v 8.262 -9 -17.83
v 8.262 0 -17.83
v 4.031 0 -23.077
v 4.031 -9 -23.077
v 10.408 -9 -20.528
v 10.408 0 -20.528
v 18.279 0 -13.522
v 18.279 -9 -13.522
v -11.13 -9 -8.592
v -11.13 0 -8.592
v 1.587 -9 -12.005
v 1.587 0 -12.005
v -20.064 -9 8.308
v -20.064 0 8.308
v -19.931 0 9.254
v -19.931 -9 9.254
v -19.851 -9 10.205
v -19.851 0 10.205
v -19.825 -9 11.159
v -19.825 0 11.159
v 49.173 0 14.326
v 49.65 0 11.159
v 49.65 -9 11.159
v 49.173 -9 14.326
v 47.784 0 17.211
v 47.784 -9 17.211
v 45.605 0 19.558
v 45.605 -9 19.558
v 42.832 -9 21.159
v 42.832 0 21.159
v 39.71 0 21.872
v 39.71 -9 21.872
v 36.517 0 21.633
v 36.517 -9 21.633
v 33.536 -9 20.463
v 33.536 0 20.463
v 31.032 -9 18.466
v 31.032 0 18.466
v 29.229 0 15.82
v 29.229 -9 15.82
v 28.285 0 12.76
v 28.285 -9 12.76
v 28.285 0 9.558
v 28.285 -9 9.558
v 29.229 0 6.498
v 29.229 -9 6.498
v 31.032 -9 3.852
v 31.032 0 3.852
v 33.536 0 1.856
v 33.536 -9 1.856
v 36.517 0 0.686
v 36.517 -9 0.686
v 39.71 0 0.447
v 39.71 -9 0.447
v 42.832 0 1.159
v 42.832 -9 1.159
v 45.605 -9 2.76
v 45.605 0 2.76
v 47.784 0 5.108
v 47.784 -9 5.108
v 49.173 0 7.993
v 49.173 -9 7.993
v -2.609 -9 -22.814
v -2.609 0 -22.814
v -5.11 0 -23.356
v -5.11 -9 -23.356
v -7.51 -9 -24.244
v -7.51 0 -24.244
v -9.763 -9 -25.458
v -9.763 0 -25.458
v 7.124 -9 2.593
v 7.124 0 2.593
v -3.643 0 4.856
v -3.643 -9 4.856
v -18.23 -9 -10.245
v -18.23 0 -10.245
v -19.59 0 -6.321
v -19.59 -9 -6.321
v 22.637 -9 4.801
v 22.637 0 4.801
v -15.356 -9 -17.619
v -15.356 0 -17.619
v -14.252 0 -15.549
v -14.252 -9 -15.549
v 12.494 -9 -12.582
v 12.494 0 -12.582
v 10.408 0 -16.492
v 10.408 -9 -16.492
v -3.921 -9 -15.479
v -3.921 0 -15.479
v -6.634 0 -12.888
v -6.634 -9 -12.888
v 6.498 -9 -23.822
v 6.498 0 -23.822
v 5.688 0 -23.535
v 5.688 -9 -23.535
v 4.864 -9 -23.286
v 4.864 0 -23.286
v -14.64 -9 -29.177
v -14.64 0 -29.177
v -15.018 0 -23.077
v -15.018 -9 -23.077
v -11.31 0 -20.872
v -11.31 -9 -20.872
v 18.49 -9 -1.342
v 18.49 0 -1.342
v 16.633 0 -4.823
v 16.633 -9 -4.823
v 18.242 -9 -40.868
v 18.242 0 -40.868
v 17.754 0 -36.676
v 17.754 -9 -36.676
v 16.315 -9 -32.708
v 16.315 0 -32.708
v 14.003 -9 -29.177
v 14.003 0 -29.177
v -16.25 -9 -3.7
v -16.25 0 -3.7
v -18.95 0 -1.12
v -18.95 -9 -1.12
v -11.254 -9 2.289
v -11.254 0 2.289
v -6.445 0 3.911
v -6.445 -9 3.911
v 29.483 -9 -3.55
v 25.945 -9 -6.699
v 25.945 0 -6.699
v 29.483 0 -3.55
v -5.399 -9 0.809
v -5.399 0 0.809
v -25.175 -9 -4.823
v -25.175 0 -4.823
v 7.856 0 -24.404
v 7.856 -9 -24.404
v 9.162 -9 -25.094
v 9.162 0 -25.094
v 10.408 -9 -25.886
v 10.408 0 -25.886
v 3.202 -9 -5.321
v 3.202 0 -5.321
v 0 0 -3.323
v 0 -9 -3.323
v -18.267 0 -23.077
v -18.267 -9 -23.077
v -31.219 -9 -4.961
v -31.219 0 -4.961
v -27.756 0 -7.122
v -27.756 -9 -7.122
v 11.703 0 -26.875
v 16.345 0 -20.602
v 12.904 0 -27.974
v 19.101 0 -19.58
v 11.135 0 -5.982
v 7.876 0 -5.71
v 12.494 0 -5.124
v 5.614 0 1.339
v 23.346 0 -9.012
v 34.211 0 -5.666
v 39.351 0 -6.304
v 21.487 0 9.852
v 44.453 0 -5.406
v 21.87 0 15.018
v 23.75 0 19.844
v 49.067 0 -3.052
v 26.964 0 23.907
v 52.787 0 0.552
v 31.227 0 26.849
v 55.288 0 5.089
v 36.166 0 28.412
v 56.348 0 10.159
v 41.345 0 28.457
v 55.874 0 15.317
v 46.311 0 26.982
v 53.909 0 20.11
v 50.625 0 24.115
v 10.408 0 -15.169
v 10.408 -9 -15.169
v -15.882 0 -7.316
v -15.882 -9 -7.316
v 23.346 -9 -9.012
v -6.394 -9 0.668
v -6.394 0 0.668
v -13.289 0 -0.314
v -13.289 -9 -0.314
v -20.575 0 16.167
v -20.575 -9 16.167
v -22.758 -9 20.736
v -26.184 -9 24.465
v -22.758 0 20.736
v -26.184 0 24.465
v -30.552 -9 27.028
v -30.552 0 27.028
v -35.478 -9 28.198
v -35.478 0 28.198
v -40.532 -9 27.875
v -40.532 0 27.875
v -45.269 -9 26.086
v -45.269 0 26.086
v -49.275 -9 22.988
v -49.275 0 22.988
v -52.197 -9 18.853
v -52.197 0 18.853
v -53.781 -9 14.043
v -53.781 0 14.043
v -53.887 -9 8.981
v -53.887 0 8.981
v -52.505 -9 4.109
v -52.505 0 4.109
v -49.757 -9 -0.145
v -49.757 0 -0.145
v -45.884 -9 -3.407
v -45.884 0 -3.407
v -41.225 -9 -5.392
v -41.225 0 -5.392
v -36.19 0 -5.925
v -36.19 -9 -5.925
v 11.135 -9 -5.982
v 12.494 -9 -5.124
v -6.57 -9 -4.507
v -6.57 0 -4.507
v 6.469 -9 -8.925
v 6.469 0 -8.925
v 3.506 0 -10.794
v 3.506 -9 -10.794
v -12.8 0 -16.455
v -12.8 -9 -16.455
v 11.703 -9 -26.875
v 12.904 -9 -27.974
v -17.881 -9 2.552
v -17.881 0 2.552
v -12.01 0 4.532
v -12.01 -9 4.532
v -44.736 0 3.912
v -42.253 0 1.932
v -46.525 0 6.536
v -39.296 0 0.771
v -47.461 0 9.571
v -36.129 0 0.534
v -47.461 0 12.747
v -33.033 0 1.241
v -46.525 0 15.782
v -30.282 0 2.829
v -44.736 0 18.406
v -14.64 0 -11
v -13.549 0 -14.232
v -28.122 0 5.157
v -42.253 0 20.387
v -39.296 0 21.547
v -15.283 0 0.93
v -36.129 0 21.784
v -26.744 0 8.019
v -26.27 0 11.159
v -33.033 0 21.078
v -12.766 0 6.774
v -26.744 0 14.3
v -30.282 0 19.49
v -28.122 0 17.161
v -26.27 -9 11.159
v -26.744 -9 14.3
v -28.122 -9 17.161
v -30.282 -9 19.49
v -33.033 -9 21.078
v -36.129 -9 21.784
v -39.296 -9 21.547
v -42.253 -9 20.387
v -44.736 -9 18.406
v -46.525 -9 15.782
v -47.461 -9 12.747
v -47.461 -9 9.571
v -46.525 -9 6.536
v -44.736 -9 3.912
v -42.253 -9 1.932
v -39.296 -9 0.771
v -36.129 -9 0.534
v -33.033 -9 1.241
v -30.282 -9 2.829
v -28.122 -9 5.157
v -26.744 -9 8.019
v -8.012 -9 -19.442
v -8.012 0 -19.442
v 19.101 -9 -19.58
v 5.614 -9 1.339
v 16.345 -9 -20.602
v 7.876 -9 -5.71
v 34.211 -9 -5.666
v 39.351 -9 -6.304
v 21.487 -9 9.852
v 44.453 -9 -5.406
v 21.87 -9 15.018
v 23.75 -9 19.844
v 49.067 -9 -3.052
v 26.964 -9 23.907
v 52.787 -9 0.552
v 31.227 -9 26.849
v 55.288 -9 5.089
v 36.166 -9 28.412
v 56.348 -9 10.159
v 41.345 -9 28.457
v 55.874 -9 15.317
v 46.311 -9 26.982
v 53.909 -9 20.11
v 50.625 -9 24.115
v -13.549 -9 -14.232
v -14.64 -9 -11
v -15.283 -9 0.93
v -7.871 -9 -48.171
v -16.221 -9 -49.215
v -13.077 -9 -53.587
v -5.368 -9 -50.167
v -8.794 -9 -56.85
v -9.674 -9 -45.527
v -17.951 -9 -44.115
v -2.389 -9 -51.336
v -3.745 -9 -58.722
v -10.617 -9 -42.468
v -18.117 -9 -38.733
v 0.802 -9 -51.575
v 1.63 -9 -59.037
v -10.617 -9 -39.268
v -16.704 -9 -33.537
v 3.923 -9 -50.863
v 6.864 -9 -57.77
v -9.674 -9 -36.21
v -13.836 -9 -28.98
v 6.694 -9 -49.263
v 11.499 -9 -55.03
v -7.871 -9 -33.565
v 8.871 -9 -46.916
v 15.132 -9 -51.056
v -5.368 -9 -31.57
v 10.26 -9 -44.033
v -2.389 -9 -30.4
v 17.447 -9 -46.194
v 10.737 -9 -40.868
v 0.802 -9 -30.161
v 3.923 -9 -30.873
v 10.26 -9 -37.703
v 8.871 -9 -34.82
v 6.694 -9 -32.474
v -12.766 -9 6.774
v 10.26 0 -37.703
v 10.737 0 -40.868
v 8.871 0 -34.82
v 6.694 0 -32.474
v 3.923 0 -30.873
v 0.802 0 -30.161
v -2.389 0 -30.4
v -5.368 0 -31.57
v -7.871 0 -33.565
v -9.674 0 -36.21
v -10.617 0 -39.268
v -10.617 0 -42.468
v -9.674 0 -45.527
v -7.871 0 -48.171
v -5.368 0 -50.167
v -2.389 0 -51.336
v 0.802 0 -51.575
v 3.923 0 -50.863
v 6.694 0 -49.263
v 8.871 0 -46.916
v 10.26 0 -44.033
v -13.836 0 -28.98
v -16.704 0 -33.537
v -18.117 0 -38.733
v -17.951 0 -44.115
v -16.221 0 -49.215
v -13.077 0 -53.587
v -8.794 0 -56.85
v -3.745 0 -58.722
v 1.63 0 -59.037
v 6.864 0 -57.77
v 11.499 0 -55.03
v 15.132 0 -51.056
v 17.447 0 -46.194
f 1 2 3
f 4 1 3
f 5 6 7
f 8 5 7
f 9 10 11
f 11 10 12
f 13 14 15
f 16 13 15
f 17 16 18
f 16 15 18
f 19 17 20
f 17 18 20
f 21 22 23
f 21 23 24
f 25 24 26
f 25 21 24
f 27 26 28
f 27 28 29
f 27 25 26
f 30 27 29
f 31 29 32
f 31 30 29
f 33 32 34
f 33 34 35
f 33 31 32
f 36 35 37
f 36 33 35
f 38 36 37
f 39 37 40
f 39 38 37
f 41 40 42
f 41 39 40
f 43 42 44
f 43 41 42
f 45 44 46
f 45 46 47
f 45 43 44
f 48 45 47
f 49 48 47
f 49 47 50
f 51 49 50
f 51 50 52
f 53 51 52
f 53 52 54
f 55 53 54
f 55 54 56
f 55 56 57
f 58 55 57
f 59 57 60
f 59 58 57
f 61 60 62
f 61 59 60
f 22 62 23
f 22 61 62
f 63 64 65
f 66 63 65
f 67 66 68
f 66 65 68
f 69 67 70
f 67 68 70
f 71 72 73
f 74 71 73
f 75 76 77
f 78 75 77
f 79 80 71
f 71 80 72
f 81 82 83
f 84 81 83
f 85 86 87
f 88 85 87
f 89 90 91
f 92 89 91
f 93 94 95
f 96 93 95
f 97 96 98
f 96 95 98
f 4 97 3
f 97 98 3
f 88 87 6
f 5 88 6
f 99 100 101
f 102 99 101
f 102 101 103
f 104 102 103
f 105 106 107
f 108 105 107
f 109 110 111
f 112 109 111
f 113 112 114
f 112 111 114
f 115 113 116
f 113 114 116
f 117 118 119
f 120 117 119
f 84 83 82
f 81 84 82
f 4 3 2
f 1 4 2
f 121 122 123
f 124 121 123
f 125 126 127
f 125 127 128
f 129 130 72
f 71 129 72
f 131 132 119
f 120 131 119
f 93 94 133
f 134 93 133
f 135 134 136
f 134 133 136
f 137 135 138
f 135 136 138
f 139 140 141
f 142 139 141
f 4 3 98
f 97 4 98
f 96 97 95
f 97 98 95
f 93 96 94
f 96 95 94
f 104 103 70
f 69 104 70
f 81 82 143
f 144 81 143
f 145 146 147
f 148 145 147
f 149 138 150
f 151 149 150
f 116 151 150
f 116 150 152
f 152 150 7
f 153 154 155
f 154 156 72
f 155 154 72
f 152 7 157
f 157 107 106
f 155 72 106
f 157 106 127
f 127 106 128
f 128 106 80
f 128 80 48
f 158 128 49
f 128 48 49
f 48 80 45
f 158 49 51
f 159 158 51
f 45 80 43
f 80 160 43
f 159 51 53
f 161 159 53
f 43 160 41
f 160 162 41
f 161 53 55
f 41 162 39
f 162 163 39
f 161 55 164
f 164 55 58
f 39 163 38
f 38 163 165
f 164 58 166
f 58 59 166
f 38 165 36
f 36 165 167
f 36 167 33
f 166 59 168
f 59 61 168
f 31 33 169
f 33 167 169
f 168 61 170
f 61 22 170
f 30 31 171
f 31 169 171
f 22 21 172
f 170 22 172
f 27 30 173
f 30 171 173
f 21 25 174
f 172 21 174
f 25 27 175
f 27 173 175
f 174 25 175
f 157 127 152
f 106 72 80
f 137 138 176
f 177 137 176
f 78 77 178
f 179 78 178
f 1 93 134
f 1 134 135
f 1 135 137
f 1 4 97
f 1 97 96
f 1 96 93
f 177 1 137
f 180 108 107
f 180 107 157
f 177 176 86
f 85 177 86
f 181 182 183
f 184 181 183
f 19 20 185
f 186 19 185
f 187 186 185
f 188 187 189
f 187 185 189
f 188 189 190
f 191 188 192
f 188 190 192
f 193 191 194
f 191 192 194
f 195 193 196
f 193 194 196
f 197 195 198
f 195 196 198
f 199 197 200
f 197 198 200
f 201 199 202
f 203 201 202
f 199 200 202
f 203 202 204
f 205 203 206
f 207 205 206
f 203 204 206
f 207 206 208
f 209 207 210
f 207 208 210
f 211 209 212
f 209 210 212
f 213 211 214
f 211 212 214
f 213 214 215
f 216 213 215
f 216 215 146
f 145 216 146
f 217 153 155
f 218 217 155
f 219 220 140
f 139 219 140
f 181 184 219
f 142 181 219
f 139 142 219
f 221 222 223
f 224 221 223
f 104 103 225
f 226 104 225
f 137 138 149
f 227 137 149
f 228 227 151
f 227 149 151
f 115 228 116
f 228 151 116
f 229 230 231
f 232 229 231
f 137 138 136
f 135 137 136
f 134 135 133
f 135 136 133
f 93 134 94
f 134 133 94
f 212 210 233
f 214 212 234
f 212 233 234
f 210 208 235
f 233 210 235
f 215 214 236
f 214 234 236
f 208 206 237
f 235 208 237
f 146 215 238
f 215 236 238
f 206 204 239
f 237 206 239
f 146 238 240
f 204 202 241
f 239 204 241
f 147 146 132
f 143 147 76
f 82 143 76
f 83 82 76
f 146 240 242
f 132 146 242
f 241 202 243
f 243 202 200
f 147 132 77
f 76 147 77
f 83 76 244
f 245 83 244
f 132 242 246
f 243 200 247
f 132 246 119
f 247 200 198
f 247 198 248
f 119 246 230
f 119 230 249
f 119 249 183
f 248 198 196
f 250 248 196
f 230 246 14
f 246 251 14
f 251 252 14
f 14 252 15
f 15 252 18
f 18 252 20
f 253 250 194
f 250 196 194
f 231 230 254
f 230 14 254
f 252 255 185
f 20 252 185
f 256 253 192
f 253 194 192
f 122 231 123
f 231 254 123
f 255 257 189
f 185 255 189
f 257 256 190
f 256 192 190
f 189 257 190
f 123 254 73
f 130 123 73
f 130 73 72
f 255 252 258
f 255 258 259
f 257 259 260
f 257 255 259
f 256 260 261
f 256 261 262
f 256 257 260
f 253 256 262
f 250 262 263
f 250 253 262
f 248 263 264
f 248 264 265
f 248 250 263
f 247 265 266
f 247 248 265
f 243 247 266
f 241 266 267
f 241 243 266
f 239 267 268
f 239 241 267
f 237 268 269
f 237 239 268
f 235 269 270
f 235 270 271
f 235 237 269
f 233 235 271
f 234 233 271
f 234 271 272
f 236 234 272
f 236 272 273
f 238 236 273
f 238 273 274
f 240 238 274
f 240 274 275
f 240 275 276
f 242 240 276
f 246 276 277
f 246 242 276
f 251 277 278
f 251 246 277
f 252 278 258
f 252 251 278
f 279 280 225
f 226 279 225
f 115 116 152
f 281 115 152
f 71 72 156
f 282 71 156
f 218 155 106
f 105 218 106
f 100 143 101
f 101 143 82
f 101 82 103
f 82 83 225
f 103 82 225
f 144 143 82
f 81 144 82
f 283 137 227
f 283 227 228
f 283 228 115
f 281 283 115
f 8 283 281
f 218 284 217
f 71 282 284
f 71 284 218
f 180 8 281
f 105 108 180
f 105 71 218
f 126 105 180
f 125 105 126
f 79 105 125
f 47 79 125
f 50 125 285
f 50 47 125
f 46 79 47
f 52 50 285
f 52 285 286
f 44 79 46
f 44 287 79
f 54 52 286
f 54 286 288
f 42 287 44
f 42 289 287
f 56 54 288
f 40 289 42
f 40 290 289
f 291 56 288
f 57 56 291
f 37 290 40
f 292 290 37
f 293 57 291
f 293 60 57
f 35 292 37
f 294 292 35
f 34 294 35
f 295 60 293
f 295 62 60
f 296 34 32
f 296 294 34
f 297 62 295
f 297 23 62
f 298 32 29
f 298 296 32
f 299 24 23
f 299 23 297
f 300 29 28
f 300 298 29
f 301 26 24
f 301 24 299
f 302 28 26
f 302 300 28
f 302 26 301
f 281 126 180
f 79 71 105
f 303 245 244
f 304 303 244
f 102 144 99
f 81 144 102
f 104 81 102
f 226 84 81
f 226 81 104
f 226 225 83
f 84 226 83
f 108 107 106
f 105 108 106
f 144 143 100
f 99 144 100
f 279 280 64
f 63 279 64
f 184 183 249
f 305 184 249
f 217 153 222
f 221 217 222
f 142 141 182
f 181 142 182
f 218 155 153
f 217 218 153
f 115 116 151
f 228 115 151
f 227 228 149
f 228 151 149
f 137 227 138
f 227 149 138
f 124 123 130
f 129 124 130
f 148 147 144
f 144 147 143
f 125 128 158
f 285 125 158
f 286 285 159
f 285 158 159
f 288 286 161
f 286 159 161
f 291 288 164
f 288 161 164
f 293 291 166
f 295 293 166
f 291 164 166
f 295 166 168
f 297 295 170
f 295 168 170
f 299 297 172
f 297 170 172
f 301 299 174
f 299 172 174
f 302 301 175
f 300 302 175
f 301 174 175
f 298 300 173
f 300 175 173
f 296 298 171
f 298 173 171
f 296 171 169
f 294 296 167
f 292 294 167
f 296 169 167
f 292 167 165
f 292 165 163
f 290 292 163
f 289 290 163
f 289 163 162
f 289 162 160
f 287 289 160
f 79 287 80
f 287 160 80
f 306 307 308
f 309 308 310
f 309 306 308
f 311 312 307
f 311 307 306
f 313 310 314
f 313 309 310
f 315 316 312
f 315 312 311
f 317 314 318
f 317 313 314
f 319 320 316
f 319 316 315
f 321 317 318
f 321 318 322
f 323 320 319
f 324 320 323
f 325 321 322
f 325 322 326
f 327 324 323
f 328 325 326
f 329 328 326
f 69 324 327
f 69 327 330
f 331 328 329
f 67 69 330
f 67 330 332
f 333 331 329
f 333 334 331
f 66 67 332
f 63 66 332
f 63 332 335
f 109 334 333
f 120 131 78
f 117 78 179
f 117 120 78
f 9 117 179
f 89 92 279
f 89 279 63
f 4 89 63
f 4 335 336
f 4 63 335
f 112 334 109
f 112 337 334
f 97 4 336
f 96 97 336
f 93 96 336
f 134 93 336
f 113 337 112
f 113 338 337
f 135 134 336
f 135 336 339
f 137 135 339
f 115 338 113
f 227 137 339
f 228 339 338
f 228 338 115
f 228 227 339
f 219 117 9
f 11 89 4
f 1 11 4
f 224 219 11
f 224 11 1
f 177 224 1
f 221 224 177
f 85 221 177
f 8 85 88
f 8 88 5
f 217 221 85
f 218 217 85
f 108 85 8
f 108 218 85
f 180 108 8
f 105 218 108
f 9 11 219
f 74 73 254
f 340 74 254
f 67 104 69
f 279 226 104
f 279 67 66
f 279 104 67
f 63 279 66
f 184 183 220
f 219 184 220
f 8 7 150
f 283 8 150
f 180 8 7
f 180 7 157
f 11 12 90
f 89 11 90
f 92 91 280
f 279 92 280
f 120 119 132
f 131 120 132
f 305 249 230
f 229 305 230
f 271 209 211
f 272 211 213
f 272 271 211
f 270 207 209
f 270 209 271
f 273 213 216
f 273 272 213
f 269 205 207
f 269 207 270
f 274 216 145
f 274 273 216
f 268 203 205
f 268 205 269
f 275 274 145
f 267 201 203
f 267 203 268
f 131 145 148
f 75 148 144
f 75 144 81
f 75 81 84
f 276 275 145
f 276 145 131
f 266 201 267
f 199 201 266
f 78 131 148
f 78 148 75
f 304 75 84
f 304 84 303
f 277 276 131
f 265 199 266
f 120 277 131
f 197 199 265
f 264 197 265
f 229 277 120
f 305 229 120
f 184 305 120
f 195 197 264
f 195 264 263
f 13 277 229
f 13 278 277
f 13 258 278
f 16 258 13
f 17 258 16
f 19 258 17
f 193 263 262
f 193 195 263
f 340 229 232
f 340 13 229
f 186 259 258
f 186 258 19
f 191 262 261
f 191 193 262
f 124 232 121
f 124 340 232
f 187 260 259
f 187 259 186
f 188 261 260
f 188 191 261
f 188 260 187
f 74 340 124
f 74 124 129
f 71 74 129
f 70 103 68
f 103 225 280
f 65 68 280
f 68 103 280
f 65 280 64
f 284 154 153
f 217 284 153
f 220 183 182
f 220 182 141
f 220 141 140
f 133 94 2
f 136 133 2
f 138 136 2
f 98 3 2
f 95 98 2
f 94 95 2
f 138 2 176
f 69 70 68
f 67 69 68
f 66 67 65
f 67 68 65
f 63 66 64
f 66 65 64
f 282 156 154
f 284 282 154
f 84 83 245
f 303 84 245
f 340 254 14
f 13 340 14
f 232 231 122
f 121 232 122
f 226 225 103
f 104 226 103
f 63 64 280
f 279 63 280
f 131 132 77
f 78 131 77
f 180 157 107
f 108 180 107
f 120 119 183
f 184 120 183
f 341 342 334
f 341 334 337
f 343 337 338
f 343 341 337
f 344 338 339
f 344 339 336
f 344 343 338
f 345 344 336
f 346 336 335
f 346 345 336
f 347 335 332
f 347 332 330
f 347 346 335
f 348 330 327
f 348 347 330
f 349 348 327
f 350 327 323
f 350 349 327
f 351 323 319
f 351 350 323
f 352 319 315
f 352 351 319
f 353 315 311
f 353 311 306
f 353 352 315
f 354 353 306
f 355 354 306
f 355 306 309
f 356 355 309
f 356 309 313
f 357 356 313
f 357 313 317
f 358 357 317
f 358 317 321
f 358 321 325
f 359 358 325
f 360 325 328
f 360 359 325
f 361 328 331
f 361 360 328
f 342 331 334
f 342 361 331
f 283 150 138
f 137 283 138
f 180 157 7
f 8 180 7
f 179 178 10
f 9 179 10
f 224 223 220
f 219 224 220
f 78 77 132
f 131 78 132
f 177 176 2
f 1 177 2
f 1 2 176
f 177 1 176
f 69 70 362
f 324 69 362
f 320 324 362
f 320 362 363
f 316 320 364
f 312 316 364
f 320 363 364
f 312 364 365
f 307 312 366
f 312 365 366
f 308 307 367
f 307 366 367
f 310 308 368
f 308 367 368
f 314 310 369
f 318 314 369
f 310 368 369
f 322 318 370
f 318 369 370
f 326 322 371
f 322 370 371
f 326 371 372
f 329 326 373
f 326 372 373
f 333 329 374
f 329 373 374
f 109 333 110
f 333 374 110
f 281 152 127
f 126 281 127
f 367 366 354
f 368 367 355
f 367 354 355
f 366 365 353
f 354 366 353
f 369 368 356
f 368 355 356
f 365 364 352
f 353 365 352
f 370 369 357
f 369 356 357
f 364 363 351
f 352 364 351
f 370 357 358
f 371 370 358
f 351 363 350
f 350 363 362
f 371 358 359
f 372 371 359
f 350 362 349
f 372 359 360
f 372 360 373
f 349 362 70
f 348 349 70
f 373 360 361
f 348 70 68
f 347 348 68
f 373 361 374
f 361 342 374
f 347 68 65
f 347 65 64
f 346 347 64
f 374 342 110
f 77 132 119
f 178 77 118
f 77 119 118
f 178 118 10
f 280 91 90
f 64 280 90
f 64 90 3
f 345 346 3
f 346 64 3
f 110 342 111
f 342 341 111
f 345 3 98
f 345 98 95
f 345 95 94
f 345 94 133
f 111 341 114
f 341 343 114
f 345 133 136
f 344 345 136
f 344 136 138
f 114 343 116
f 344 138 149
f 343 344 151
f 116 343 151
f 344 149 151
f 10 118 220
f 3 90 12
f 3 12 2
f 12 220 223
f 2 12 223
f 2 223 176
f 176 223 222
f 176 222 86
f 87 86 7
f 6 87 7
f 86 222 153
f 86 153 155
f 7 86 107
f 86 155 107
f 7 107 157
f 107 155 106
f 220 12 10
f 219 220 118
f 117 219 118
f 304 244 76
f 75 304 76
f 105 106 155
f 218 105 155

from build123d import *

# Parameters (mm, degrees)
F0_R     = 10.6549645795
F1_DEPTH = 9
F0_R_2   = 10.7427439212
F0_R_3   = 10.7368986297
F2_DEPTH = 9


with BuildPart() as f1:
    # F0 (on Front) → F1 (new body)
    with BuildSketch(Plane.XZ):
        with BuildLine():
            ThreePointArc((-20.0641651181, 8.3083463069), (-19.8847789494, 9.7287968623), (-19.8248435155, 11.1592747271))
            ThreePointArc((-19.8248435155, 11.1592747271), (-50.8899433357, 21.0294767793), (-31.2187251884, -4.9609924738))
            ThreePointArc((-31.2187251884, -4.9609924738), (-29.9643391784, -4.4603530234), (-28.7533751249, -3.8622809686))
            ThreePointArc((-28.7533751249, -3.8622809686), (-25.1760860399, -1.2658091713), (-22.3838279271, 2.160844827))
            ThreePointArc((-22.3838279271, 2.160844827), (-21.7131808774, 3.3479085645), (-21.1392335311, 4.5846268937))
            ThreePointArc((-21.1392335311, 4.5846268937), (-20.4958618387, 6.4159304479), (-20.0641651181, 8.3083463069))
        make_face()
        with Locations((-36.9254052639, 11.1592747271)):
            Circle(F0_R, mode=Mode.SUBTRACT)
        Polygon((-25.0467206421, -8.8123781663), (-27.7558582251, -7.1218522362), (-18.2671947269, -23.0767760102), (-15.3557659771, -17.6188090984), (-14.2515066154, -15.5486876646), align=None)
        Polygon((-18.2299170021, -10.2454867911), (-25.0467206421, -8.8123781663), (-14.2515066154, -15.5486876646), (-13.549314167, -14.2323088422), (-14.6395119997, -11.0003039528), align=None)
        with BuildLine():
            ThreePointArc((-28.7533751249, -3.8622809686), (-29.9643391784, -4.4603530234), (-31.2187251884, -4.9609924738))
            Line((-31.2187251884, -4.9609924738), (-27.7558582251, -7.1218522362))
            Line((-27.7558582251, -7.1218522362), (-25.0467206421, -8.8123781663))
            Line((-25.0467206421, -8.8123781663), (-18.2299170021, -10.2454867911))
            Line((-18.2299170021, -10.2454867911), (-19.5899773533, -6.3213815905))
            Line((-19.5899773533, -6.3213815905), (-25.1752715024, -4.8225052285))
            Line((-25.1752715024, -4.8225052285), (-28.7533751249, -3.8622809686))
        make_face()
        with BuildLine():
            ThreePointArc((-22.3838279271, 2.160844827), (-25.1760860399, -1.2658091713), (-28.7533751249, -3.8622809686))
            Line((-28.7533751249, -3.8622809686), (-25.1752715024, -4.8225052285))
            Line((-25.1752715024, -4.8225052285), (-18.9498499083, -1.120141527))
            Line((-18.9498499083, -1.120141527), (-22.3838279271, 2.160844827))
        make_face()
        with BuildLine():
            Line((-17.8814207304, 2.5517227513), (-21.1392335311, 4.5846268937))
            ThreePointArc((-21.1392335311, 4.5846268937), (-21.7131808774, 3.3479085645), (-22.3838279271, 2.160844827))
            Line((-22.3838279271, 2.160844827), (-18.9498499083, -1.120141527))
            Line((-18.9498499083, -1.120141527), (-13.2888618781, -0.3140747904))
            Line((-13.2888618781, -0.3140747904), (-15.2833322411, 0.9304924426))
            Line((-15.2833322411, 0.9304924426), (-17.8814207304, 2.5517227513))
        make_face()
        with BuildLine():
            Line((-12.7662490274, 6.7740925649), (-20.0641651181, 8.3083463069))
            ThreePointArc((-20.0641651181, 8.3083463069), (-20.4958618387, 6.4159304479), (-21.1392335311, 4.5846268937))
            Line((-21.1392335311, 4.5846268937), (-17.8814207304, 2.5517227513))
            Line((-17.8814207304, 2.5517227513), (-12.0100549904, 4.5317209614))
            Line((-12.0100549904, 4.5317209614), (-12.7662490274, 6.7740925649))
        make_face()
        Polygon((-3.6427459963, 4.856042468), (-12.7662490274, 6.7740925649), (-12.0100549904, 4.5317209614), (-11.2538609534, 2.2893493578), (-6.4448630441, 3.9110857092), align=None)
        Polygon((7.1240645524, 2.5925169398), (-3.6427459963, 4.856042468), (-6.4448630441, 3.9110857092), (-5.3988756119, 0.809378474), align=None)
    extrude(amount=F1_DEPTH)


with BuildPart() as f1b:
    # F0 (on Front) → F1, piece 2 (new body)
    with BuildSketch(Plane.XZ):
        Polygon((20.3268225381, -0.1831221045), (7.1240645524, 2.5925169398), (5.614161229, 1.3388415648), (7.8762154199, -5.7102254828), (11.1348283668, -5.9817398032), (12.4938078114, -5.1244500669), (18.489636341, -1.3420806721), align=None)
        with BuildLine():
            Line((22.6365502477, 4.8013360815), (7.1240645524, 2.5925169398))
            Line((7.1240645524, 2.5925169398), (20.3268225381, -0.1831221045))
            Line((20.3268225381, -0.1831221045), (23.9641546685, 2.1114287921))
            ThreePointArc((23.9641546685, 2.1114287921), (23.242508483, 3.4278335283), (22.6365502477, 4.8013360815))
        make_face()
        with BuildLine():
            Line((23.9641546685, 2.1114287921), (20.3268225381, -0.1831221045))
            Line((20.3268225381, -0.1831221045), (18.489636341, -1.3420806721))
            Line((18.489636341, -1.3420806721), (16.6330827417, -4.8225052285))
            Line((16.6330827417, -4.8225052285), (23.3463423185, -9.0116388705))
            Line((23.3463423185, -9.0116388705), (25.9445380029, -6.6990820895))
            Line((25.9445380029, -6.6990820895), (29.4831423015, -3.5495027815))
            ThreePointArc((29.4831423015, -3.5495027815), (26.3991907736, -1.0353591536), (23.9641546685, 2.1114287921))
        make_face()
        Polygon((19.1012873615, -19.5802079989), (25.9445380029, -6.6990820895), (23.3463423185, -9.0116388705), (18.2790667344, -13.5218313026), align=None)
        Polygon((16.345179662, -20.6019715923), (14.0030779473, -29.1766236231), (19.1012873615, -19.5802079989), (18.2790667344, -13.5218313026), align=None)
        with BuildLine():
            ThreePointArc((10.4080032293, -25.886430227), (12.315906958, -27.410933605), (14.0030779473, -29.1766236231))
            Line((14.0030779473, -29.1766236231), (16.345179662, -20.6019715923))
            Line((16.345179662, -20.6019715923), (10.4080032293, -25.886430227))
        make_face()
        with BuildLine():
            ThreePointArc((56.3764595874, 11.1592747271), (35.6725420551, 28.3261386375), (22.6365502477, 4.8013360815))
            ThreePointArc((22.6365502477, 4.8013360815), (23.242508483, 3.4278335283), (23.9641546685, 2.1114287921))
            ThreePointArc((23.9641546685, 2.1114287921), (26.3991907736, -1.0353591536), (29.4831423015, -3.5495027815))
            ThreePointArc((29.4831423015, -3.5495027815), (47.2899577301, -4.1671619954), (56.3764595874, 11.1592747271))
        make_face()
        with Locations((38.9074608684, 11.1592747271)):
            Circle(F0_R_2, mode=Mode.SUBTRACT)
    extrude(amount=F1_DEPTH)


with BuildPart() as f1c:
    # F0 (on Front) → F1, piece 3 (new body)
    with BuildSketch(Plane.XZ):
        with BuildLine():
            Line((10.4080032293, -16.4924724238), (6.4979792818, -23.8224753755))
            ThreePointArc((6.4979792818, -23.8224753755), (8.5157523786, -24.7355560658), (10.4080032293, -25.886430227))
            Line((10.4080032293, -25.886430227), (10.4080032293, -20.5275704744))
            Line((10.4080032293, -20.5275704744), (10.4080032293, -16.4924724238))
        make_face()
        with BuildLine():
            Line((8.2622126873, -17.829527017), (4.0306175632, -23.0767760102))
            ThreePointArc((4.0306175632, -23.0767760102), (5.2774856482, -23.405991948), (6.4979792818, -23.8224753755))
            Line((6.4979792818, -23.8224753755), (10.4080032293, -16.4924724238))
            Line((10.4080032293, -16.4924724238), (10.4080032293, -15.1687107218))
            Line((10.4080032293, -15.1687107218), (8.2622126873, -17.829527017))
        make_face()
    extrude(amount=F1_DEPTH)


with BuildPart() as f1d:
    # F0 (on Front) → F1, piece 4 (new body)
    with BuildSketch(Plane.XZ):
        with BuildLine():
            Line((-8.0116618445, -19.4424062602), (-12.799695782, -16.4546305281))
            Line((-12.799695782, -16.4546305281), (-11.309759062, -20.8717029341))
            Line((-11.309759062, -20.8717029341), (-9.7626927787, -25.4581418738))
            ThreePointArc((-9.7626927787, -25.4581418738), (-6.3257664341, -23.7578184265), (-2.6093390953, -22.8135036705))
            Line((-2.6093390953, -22.8135036705), (-8.0116618445, -19.4424062602))
        make_face()
    extrude(amount=F1_DEPTH)


with BuildPart() as f2:
    # F0 (on Front) → F2 (new body)
    with BuildSketch(Plane.XZ):
        with BuildLine():
            ThreePointArc((-2.6093390953, -22.8135036705), (-6.3257664341, -23.7578184265), (-9.7626927787, -25.4581418738))
            ThreePointArc((-9.7626927787, -25.4581418738), (-8.7944218619, -56.8503935348), (18.2421567817, -40.8680774271))
            ThreePointArc((18.2421567817, -40.8680774271), (17.1496738656, -34.6499611244), (14.0030779473, -29.1766236231))
            ThreePointArc((14.0030779473, -29.1766236231), (12.315906958, -27.410933605), (10.4080032293, -25.886430227))
            ThreePointArc((10.4080032293, -25.886430227), (8.5157523786, -24.7355560658), (6.4979792818, -23.8224753755))
            ThreePointArc((6.4979792818, -23.8224753755), (5.2774856482, -23.405991948), (4.0306175632, -23.0767760102))
            ThreePointArc((4.0306175632, -23.0767760102), (0.7227283045, -22.6402430016), (-2.6093390953, -22.8135036705))
        make_face()
        with Locations((0, -40.8680774271)):
            Circle(F0_R_3, mode=Mode.SUBTRACT)
        with BuildLine():
            Line((-6.6336407615, -12.8876350643), (-8.0116618445, -19.4424062602))
            Line((-8.0116618445, -19.4424062602), (-2.6093390953, -22.8135036705))
            ThreePointArc((-2.6093390953, -22.8135036705), (0.7227283045, -22.6402430016), (4.0306175632, -23.0767760102))
            Line((4.0306175632, -23.0767760102), (-1.6044713798, -17.6927433157))
            Line((-1.6044713798, -17.6927433157), (-3.9209753848, -15.479444923))
            Line((-3.9209753848, -15.479444923), (-6.6336407615, -12.8876350643))
        make_face()
        Polygon((-1.6044713798, -17.6927433157), (4.0306175632, -23.0767760102), (8.2622126873, -17.829527017), align=None)
        Polygon((23.3463423185, -9.0116388705), (16.6330827417, -4.8225052285), (12.4938078114, -12.5822780238), (10.4080032293, -16.4924724238), (10.4080032293, -20.5275704744), (18.2790667344, -13.5218313026), align=None)
        Polygon((-6.5703091643, -4.506511397), (-16.2496871909, -3.7000057488), (-11.1298363847, -8.5917553575), (1.5874098329, -12.0045710905), (3.5060337104, -10.7942389073), align=None)
        Polygon((16.6330827417, -4.8225052285), (18.489636341, -1.3420806721), (12.4938078114, -5.1244500669), (11.1348283668, -5.9817398032), (6.4692324018, -8.924953956), (10.4080032293, -15.1687107218), (12.4938078114, -12.5822780238), align=None)
        Polygon((6.4692324018, -8.924953956), (3.5060337104, -10.7942389073), (4.0306175632, -11.1215838939), (8.2622126873, -17.829527017), (10.4080032293, -15.1687107218), align=None)
        Polygon((3.5060337104, -10.7942389073), (1.5874098329, -12.0045710905), (-3.9209753848, -15.479444923), (-1.6044713798, -17.6927433157), (8.2622126873, -17.829527017), (4.0306175632, -11.1215838939), align=None)
        Polygon((-18.9498499083, -1.120141527), (-25.1752715024, -4.8225052285), (-19.5899773533, -6.3213815905), (-15.8821335544, -7.3164230827), (-11.1298363847, -8.5917553575), (-16.2496871909, -3.7000057488), align=None)
    extrude(amount=F2_DEPTH)


with BuildPart() as f2b:
    # F0 (on Front) → F2, piece 2 (new body)
    with BuildSketch(Plane.XZ):
        Polygon((-15.3557659771, -17.6188090984), (-18.2671947269, -23.0767760102), (-14.6395119997, -29.1766236231), (-15.017528112, -23.0767760102), align=None)
        Polygon((-12.799695782, -16.4546305281), (-14.2515066154, -15.5486876646), (-15.3557659771, -17.6188090984), (-15.017528112, -23.0767760102), (-11.309759062, -20.8717029341), align=None)
    extrude(amount=F2_DEPTH)


with BuildPart() as f2c:
    # F0 (on Front) → F2, piece 3 (new body)
    with BuildSketch(Plane.XZ):
        Polygon((-6.3944912084, 0.6676130064), (-13.2888618781, -0.3140747904), (-6.5703091643, -4.506511397), (3.2021432602, -5.320772195), (0, -3.3226063406), align=None)
    extrude(amount=F2_DEPTH)


solid = Compound([f1.part, f1b.part, f1c.part, f1d.part, f2.part, f2b.part, f2c.part])
